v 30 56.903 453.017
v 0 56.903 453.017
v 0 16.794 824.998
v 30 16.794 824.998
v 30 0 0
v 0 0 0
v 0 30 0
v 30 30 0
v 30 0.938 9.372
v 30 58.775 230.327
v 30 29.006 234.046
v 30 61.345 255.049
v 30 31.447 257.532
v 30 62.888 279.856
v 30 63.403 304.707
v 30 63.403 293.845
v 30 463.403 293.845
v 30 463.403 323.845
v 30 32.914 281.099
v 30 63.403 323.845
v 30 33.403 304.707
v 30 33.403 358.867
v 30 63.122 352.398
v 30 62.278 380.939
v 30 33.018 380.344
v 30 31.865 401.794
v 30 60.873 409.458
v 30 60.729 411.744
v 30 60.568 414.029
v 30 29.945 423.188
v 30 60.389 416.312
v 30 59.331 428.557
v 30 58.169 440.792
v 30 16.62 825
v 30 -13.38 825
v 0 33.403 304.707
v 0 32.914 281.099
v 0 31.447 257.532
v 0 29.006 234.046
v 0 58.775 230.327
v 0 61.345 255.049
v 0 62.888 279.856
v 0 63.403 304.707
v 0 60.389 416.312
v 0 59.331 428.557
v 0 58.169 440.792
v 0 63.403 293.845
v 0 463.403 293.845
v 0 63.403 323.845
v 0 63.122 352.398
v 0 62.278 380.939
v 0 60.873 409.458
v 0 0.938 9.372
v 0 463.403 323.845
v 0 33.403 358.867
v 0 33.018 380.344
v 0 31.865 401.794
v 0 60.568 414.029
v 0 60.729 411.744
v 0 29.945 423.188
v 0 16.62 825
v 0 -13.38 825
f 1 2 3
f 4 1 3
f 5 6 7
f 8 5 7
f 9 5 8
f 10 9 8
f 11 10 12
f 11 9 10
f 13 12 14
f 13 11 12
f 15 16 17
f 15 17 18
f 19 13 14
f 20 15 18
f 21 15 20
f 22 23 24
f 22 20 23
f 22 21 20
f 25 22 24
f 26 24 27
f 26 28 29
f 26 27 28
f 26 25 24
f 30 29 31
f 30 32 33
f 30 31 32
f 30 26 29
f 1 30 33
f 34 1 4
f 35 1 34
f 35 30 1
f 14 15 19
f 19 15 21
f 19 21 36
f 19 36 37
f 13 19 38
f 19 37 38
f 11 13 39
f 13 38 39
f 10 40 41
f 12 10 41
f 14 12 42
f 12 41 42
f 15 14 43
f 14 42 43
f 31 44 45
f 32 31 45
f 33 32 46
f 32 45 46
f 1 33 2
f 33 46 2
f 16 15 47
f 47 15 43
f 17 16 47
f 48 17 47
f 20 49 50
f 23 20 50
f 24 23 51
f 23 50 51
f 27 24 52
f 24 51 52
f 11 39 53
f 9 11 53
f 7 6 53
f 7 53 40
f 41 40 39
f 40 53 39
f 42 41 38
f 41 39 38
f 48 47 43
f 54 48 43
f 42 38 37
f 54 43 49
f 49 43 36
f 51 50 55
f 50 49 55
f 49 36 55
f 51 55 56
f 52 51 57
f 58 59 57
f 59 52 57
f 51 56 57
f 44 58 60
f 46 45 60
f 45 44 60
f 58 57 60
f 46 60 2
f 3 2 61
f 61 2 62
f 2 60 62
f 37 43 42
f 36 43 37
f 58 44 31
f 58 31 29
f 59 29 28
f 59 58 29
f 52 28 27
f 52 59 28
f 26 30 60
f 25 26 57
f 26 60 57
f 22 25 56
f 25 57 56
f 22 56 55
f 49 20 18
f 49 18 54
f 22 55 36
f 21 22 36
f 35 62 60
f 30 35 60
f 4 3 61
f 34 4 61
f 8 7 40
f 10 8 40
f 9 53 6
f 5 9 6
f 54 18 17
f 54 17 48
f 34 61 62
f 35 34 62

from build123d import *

# Parameters (mm, degrees)
F1_DEPTH    = 30
F2_T1_DEPTH = 163.7053411471
F2_T3_DEPTH = 285.7735535498
F3_T1_DEPTH = 47.177253683
F4_W        = 30
F4_H        = 30
F5_DEPTH    = 400


# Not quite as in the source:
# - a fillet or chamfer that OpenCascade refuses, or shapes differently, is made with other operations: its cross-section is extruded or revolved along the edge and cut away or added


with BuildPart() as f1:
    # F0 (on Right) → F1 (new body)
    with BuildSketch(Plane.YZ):
        with BuildLine():
            Line((0.9376178496, 9.3718236312), (0, 0))
            Line((0, 0), (30, 0))
            Line((30, 0), (58.7747889852, 230.3266173388))
            ThreePointArc((58.7747889852, 230.3266173388), (62.2448009202, 267.4447024247), (63.4029619396, 304.7066385838))
            Line((63.4029619396, 304.7066385838), (63.4029619396, 375))
            Line((63.4029619396, 375), (59.769593104, 426.4305293125))
            Line((59.769593104, 426.4305293125), (16.7944896966, 824.9977231026))
            Line((16.7944896966, 824.9977231026), (16.6203579544, 825))
            Line((16.6203579544, 825), (-13.3796420456, 825))
            Line((-13.3796420456, 825), (29.9452786307, 423.188469929))
            ThreePointArc((29.9452786307, 423.188469929), (32.5379175275, 391.0741192729), (33.4029619396, 358.8668996991))
            Line((33.4029619396, 358.8668996991), (33.4029619396, 304.7066385838))
            ThreePointArc((33.4029619396, 304.7066385838), (32.3027089712, 269.3077992327), (29.0061976329, 234.0456184011))
            Line((29.0061976329, 234.0456184011), (0.9376178496, 9.3718236312))
        make_face()
    extrude(amount=F1_DEPTH)

    # F2: fillet of radius 1450 on 4 edges, made by hand

    # F2_s2 → F2_t1 (cut)
    with BuildSketch(Plane.YZ.offset(-66.8526705736)):
        with BuildLine():
            ThreePointArc((61.6540498994, 399.7559430432), (59.5240083024, 426.4086220464), (56.9028806071, 453.0174939664))
            Line((56.9028806071, 453.0174939664), (59.769593104, 426.4305293125))
            Line((59.769593104, 426.4305293125), (61.6540498994, 399.7559430432))
        make_face()
    extrude(amount=F2_T1_DEPTH, mode=Mode.SUBTRACT)

    # F2_s4 → F2_t3 (cut)
    with BuildSketch(Plane.YZ.offset(-127.8867767749)):
        with BuildLine():
            ThreePointArc((63.4029619396, 323.84528929), (62.5014570183, 374.968195708), (59.7980632353, 426.027533089))
            Line((59.7980632353, 426.027533089), (63.4029619396, 375))
            Line((63.4029619396, 375), (63.4029619396, 323.84528929))
        make_face()
    extrude(amount=F2_T3_DEPTH, mode=Mode.SUBTRACT)

    # F3: fillet of radius 300 on 4 edges, made by hand

    # F3_s2 → F3_t1 (cut)
    with BuildSketch(Plane.YZ.offset(-8.5886268415)):
        with BuildLine():
            ThreePointArc((60.3891403463, 416.3117677563), (60.6508457711, 412.8864247118), (60.8733107804, 409.4583094831))
            ThreePointArc((60.8733107804, 409.4583094831), (60.7708746607, 411.1729780567), (60.666407351, 412.8875240775))
            ThreePointArc((60.666407351, 412.8875240775), (60.5287879715, 414.5997280322), (60.3891403463, 416.3117677563))
        make_face()
    extrude(amount=F3_T1_DEPTH, mode=Mode.SUBTRACT)

    # F4 (on face) → F5 (join)
    with BuildSketch(Plane(origin=(0, 63.4029619396, 0), x_dir=(-1, 0, 0), z_dir=(0, 1, 0))):
        with Locations((-15, 308.84528929)):
            Rectangle(F4_W, F4_H)
    extrude(amount=F5_DEPTH)


solid = f1.part
